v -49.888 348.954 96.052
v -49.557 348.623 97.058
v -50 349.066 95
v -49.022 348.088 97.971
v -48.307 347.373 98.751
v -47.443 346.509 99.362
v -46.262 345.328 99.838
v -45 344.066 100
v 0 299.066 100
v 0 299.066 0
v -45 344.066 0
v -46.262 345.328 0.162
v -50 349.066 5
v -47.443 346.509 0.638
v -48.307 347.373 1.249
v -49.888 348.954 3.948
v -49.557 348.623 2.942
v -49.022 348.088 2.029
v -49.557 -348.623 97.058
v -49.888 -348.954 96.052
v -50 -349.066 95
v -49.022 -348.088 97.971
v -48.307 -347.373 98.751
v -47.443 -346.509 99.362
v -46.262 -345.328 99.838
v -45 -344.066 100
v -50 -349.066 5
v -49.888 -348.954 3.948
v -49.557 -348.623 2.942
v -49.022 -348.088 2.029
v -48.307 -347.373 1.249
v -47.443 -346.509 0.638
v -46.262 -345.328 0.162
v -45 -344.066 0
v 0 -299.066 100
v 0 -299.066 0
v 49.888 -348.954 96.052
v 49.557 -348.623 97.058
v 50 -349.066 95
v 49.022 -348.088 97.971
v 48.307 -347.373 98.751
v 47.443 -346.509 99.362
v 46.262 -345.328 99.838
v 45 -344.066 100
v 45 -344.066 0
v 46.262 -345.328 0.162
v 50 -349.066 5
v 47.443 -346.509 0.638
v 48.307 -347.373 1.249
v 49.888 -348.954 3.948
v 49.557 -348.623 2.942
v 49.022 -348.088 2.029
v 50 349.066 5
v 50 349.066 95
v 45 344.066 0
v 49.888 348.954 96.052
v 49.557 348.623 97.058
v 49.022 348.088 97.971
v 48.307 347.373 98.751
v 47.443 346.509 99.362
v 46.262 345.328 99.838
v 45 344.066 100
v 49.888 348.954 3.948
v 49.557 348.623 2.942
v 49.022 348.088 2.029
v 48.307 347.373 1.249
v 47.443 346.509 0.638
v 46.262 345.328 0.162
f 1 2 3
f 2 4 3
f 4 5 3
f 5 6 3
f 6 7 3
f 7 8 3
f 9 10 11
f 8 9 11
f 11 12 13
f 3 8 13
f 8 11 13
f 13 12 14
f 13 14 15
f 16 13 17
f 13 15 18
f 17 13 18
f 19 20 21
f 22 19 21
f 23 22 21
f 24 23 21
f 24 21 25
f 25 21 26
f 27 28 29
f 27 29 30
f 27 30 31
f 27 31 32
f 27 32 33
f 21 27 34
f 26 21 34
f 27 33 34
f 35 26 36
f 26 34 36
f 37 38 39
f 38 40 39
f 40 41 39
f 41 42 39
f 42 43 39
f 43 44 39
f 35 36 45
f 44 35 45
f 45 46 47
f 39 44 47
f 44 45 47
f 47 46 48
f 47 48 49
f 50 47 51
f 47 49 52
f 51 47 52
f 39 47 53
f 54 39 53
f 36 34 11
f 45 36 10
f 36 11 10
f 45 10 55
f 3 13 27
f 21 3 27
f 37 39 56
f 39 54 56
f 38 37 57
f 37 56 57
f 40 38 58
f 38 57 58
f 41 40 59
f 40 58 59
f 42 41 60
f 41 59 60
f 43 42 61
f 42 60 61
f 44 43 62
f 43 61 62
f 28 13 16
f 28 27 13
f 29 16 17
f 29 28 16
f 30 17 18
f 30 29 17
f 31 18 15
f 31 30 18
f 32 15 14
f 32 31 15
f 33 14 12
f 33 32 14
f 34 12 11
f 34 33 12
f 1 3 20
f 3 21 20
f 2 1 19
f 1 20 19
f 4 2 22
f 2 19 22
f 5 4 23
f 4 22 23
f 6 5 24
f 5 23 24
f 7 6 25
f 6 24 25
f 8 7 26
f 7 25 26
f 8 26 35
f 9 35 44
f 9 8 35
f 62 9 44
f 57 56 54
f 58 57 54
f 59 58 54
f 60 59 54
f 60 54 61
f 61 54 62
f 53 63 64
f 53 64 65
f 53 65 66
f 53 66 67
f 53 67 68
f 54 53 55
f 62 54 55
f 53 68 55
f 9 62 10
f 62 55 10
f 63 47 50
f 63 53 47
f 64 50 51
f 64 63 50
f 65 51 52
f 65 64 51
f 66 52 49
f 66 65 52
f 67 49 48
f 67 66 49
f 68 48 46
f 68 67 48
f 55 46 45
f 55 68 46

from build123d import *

# Parameters (mm, degrees)
F1_DEPTH = 100
F2_R     = 5


with BuildPart() as f1:
    # F0 (on Top) → F1 (new body)
    with BuildSketch(Plane.XY):
        Polygon((-49.999979, 349.065976), (-50.000021, -349.066024), (0, -299.066), (49.999979, -349.065976), (50.000021, 349.066024), (0, 299.066), align=None)
    extrude(amount=F1_DEPTH)

    # F2
    f2_edges = [f1.edges().sort_by_distance(p)[0] for p in [
        (50, 2.4e-05, 100),
        (50, 2.4e-05, 0),
        (-50, -2.4e-05, 100),
        (-50, -2.4e-05, 0),
    ]]
    fillet(f2_edges, radius=F2_R)


solid = f1.part
